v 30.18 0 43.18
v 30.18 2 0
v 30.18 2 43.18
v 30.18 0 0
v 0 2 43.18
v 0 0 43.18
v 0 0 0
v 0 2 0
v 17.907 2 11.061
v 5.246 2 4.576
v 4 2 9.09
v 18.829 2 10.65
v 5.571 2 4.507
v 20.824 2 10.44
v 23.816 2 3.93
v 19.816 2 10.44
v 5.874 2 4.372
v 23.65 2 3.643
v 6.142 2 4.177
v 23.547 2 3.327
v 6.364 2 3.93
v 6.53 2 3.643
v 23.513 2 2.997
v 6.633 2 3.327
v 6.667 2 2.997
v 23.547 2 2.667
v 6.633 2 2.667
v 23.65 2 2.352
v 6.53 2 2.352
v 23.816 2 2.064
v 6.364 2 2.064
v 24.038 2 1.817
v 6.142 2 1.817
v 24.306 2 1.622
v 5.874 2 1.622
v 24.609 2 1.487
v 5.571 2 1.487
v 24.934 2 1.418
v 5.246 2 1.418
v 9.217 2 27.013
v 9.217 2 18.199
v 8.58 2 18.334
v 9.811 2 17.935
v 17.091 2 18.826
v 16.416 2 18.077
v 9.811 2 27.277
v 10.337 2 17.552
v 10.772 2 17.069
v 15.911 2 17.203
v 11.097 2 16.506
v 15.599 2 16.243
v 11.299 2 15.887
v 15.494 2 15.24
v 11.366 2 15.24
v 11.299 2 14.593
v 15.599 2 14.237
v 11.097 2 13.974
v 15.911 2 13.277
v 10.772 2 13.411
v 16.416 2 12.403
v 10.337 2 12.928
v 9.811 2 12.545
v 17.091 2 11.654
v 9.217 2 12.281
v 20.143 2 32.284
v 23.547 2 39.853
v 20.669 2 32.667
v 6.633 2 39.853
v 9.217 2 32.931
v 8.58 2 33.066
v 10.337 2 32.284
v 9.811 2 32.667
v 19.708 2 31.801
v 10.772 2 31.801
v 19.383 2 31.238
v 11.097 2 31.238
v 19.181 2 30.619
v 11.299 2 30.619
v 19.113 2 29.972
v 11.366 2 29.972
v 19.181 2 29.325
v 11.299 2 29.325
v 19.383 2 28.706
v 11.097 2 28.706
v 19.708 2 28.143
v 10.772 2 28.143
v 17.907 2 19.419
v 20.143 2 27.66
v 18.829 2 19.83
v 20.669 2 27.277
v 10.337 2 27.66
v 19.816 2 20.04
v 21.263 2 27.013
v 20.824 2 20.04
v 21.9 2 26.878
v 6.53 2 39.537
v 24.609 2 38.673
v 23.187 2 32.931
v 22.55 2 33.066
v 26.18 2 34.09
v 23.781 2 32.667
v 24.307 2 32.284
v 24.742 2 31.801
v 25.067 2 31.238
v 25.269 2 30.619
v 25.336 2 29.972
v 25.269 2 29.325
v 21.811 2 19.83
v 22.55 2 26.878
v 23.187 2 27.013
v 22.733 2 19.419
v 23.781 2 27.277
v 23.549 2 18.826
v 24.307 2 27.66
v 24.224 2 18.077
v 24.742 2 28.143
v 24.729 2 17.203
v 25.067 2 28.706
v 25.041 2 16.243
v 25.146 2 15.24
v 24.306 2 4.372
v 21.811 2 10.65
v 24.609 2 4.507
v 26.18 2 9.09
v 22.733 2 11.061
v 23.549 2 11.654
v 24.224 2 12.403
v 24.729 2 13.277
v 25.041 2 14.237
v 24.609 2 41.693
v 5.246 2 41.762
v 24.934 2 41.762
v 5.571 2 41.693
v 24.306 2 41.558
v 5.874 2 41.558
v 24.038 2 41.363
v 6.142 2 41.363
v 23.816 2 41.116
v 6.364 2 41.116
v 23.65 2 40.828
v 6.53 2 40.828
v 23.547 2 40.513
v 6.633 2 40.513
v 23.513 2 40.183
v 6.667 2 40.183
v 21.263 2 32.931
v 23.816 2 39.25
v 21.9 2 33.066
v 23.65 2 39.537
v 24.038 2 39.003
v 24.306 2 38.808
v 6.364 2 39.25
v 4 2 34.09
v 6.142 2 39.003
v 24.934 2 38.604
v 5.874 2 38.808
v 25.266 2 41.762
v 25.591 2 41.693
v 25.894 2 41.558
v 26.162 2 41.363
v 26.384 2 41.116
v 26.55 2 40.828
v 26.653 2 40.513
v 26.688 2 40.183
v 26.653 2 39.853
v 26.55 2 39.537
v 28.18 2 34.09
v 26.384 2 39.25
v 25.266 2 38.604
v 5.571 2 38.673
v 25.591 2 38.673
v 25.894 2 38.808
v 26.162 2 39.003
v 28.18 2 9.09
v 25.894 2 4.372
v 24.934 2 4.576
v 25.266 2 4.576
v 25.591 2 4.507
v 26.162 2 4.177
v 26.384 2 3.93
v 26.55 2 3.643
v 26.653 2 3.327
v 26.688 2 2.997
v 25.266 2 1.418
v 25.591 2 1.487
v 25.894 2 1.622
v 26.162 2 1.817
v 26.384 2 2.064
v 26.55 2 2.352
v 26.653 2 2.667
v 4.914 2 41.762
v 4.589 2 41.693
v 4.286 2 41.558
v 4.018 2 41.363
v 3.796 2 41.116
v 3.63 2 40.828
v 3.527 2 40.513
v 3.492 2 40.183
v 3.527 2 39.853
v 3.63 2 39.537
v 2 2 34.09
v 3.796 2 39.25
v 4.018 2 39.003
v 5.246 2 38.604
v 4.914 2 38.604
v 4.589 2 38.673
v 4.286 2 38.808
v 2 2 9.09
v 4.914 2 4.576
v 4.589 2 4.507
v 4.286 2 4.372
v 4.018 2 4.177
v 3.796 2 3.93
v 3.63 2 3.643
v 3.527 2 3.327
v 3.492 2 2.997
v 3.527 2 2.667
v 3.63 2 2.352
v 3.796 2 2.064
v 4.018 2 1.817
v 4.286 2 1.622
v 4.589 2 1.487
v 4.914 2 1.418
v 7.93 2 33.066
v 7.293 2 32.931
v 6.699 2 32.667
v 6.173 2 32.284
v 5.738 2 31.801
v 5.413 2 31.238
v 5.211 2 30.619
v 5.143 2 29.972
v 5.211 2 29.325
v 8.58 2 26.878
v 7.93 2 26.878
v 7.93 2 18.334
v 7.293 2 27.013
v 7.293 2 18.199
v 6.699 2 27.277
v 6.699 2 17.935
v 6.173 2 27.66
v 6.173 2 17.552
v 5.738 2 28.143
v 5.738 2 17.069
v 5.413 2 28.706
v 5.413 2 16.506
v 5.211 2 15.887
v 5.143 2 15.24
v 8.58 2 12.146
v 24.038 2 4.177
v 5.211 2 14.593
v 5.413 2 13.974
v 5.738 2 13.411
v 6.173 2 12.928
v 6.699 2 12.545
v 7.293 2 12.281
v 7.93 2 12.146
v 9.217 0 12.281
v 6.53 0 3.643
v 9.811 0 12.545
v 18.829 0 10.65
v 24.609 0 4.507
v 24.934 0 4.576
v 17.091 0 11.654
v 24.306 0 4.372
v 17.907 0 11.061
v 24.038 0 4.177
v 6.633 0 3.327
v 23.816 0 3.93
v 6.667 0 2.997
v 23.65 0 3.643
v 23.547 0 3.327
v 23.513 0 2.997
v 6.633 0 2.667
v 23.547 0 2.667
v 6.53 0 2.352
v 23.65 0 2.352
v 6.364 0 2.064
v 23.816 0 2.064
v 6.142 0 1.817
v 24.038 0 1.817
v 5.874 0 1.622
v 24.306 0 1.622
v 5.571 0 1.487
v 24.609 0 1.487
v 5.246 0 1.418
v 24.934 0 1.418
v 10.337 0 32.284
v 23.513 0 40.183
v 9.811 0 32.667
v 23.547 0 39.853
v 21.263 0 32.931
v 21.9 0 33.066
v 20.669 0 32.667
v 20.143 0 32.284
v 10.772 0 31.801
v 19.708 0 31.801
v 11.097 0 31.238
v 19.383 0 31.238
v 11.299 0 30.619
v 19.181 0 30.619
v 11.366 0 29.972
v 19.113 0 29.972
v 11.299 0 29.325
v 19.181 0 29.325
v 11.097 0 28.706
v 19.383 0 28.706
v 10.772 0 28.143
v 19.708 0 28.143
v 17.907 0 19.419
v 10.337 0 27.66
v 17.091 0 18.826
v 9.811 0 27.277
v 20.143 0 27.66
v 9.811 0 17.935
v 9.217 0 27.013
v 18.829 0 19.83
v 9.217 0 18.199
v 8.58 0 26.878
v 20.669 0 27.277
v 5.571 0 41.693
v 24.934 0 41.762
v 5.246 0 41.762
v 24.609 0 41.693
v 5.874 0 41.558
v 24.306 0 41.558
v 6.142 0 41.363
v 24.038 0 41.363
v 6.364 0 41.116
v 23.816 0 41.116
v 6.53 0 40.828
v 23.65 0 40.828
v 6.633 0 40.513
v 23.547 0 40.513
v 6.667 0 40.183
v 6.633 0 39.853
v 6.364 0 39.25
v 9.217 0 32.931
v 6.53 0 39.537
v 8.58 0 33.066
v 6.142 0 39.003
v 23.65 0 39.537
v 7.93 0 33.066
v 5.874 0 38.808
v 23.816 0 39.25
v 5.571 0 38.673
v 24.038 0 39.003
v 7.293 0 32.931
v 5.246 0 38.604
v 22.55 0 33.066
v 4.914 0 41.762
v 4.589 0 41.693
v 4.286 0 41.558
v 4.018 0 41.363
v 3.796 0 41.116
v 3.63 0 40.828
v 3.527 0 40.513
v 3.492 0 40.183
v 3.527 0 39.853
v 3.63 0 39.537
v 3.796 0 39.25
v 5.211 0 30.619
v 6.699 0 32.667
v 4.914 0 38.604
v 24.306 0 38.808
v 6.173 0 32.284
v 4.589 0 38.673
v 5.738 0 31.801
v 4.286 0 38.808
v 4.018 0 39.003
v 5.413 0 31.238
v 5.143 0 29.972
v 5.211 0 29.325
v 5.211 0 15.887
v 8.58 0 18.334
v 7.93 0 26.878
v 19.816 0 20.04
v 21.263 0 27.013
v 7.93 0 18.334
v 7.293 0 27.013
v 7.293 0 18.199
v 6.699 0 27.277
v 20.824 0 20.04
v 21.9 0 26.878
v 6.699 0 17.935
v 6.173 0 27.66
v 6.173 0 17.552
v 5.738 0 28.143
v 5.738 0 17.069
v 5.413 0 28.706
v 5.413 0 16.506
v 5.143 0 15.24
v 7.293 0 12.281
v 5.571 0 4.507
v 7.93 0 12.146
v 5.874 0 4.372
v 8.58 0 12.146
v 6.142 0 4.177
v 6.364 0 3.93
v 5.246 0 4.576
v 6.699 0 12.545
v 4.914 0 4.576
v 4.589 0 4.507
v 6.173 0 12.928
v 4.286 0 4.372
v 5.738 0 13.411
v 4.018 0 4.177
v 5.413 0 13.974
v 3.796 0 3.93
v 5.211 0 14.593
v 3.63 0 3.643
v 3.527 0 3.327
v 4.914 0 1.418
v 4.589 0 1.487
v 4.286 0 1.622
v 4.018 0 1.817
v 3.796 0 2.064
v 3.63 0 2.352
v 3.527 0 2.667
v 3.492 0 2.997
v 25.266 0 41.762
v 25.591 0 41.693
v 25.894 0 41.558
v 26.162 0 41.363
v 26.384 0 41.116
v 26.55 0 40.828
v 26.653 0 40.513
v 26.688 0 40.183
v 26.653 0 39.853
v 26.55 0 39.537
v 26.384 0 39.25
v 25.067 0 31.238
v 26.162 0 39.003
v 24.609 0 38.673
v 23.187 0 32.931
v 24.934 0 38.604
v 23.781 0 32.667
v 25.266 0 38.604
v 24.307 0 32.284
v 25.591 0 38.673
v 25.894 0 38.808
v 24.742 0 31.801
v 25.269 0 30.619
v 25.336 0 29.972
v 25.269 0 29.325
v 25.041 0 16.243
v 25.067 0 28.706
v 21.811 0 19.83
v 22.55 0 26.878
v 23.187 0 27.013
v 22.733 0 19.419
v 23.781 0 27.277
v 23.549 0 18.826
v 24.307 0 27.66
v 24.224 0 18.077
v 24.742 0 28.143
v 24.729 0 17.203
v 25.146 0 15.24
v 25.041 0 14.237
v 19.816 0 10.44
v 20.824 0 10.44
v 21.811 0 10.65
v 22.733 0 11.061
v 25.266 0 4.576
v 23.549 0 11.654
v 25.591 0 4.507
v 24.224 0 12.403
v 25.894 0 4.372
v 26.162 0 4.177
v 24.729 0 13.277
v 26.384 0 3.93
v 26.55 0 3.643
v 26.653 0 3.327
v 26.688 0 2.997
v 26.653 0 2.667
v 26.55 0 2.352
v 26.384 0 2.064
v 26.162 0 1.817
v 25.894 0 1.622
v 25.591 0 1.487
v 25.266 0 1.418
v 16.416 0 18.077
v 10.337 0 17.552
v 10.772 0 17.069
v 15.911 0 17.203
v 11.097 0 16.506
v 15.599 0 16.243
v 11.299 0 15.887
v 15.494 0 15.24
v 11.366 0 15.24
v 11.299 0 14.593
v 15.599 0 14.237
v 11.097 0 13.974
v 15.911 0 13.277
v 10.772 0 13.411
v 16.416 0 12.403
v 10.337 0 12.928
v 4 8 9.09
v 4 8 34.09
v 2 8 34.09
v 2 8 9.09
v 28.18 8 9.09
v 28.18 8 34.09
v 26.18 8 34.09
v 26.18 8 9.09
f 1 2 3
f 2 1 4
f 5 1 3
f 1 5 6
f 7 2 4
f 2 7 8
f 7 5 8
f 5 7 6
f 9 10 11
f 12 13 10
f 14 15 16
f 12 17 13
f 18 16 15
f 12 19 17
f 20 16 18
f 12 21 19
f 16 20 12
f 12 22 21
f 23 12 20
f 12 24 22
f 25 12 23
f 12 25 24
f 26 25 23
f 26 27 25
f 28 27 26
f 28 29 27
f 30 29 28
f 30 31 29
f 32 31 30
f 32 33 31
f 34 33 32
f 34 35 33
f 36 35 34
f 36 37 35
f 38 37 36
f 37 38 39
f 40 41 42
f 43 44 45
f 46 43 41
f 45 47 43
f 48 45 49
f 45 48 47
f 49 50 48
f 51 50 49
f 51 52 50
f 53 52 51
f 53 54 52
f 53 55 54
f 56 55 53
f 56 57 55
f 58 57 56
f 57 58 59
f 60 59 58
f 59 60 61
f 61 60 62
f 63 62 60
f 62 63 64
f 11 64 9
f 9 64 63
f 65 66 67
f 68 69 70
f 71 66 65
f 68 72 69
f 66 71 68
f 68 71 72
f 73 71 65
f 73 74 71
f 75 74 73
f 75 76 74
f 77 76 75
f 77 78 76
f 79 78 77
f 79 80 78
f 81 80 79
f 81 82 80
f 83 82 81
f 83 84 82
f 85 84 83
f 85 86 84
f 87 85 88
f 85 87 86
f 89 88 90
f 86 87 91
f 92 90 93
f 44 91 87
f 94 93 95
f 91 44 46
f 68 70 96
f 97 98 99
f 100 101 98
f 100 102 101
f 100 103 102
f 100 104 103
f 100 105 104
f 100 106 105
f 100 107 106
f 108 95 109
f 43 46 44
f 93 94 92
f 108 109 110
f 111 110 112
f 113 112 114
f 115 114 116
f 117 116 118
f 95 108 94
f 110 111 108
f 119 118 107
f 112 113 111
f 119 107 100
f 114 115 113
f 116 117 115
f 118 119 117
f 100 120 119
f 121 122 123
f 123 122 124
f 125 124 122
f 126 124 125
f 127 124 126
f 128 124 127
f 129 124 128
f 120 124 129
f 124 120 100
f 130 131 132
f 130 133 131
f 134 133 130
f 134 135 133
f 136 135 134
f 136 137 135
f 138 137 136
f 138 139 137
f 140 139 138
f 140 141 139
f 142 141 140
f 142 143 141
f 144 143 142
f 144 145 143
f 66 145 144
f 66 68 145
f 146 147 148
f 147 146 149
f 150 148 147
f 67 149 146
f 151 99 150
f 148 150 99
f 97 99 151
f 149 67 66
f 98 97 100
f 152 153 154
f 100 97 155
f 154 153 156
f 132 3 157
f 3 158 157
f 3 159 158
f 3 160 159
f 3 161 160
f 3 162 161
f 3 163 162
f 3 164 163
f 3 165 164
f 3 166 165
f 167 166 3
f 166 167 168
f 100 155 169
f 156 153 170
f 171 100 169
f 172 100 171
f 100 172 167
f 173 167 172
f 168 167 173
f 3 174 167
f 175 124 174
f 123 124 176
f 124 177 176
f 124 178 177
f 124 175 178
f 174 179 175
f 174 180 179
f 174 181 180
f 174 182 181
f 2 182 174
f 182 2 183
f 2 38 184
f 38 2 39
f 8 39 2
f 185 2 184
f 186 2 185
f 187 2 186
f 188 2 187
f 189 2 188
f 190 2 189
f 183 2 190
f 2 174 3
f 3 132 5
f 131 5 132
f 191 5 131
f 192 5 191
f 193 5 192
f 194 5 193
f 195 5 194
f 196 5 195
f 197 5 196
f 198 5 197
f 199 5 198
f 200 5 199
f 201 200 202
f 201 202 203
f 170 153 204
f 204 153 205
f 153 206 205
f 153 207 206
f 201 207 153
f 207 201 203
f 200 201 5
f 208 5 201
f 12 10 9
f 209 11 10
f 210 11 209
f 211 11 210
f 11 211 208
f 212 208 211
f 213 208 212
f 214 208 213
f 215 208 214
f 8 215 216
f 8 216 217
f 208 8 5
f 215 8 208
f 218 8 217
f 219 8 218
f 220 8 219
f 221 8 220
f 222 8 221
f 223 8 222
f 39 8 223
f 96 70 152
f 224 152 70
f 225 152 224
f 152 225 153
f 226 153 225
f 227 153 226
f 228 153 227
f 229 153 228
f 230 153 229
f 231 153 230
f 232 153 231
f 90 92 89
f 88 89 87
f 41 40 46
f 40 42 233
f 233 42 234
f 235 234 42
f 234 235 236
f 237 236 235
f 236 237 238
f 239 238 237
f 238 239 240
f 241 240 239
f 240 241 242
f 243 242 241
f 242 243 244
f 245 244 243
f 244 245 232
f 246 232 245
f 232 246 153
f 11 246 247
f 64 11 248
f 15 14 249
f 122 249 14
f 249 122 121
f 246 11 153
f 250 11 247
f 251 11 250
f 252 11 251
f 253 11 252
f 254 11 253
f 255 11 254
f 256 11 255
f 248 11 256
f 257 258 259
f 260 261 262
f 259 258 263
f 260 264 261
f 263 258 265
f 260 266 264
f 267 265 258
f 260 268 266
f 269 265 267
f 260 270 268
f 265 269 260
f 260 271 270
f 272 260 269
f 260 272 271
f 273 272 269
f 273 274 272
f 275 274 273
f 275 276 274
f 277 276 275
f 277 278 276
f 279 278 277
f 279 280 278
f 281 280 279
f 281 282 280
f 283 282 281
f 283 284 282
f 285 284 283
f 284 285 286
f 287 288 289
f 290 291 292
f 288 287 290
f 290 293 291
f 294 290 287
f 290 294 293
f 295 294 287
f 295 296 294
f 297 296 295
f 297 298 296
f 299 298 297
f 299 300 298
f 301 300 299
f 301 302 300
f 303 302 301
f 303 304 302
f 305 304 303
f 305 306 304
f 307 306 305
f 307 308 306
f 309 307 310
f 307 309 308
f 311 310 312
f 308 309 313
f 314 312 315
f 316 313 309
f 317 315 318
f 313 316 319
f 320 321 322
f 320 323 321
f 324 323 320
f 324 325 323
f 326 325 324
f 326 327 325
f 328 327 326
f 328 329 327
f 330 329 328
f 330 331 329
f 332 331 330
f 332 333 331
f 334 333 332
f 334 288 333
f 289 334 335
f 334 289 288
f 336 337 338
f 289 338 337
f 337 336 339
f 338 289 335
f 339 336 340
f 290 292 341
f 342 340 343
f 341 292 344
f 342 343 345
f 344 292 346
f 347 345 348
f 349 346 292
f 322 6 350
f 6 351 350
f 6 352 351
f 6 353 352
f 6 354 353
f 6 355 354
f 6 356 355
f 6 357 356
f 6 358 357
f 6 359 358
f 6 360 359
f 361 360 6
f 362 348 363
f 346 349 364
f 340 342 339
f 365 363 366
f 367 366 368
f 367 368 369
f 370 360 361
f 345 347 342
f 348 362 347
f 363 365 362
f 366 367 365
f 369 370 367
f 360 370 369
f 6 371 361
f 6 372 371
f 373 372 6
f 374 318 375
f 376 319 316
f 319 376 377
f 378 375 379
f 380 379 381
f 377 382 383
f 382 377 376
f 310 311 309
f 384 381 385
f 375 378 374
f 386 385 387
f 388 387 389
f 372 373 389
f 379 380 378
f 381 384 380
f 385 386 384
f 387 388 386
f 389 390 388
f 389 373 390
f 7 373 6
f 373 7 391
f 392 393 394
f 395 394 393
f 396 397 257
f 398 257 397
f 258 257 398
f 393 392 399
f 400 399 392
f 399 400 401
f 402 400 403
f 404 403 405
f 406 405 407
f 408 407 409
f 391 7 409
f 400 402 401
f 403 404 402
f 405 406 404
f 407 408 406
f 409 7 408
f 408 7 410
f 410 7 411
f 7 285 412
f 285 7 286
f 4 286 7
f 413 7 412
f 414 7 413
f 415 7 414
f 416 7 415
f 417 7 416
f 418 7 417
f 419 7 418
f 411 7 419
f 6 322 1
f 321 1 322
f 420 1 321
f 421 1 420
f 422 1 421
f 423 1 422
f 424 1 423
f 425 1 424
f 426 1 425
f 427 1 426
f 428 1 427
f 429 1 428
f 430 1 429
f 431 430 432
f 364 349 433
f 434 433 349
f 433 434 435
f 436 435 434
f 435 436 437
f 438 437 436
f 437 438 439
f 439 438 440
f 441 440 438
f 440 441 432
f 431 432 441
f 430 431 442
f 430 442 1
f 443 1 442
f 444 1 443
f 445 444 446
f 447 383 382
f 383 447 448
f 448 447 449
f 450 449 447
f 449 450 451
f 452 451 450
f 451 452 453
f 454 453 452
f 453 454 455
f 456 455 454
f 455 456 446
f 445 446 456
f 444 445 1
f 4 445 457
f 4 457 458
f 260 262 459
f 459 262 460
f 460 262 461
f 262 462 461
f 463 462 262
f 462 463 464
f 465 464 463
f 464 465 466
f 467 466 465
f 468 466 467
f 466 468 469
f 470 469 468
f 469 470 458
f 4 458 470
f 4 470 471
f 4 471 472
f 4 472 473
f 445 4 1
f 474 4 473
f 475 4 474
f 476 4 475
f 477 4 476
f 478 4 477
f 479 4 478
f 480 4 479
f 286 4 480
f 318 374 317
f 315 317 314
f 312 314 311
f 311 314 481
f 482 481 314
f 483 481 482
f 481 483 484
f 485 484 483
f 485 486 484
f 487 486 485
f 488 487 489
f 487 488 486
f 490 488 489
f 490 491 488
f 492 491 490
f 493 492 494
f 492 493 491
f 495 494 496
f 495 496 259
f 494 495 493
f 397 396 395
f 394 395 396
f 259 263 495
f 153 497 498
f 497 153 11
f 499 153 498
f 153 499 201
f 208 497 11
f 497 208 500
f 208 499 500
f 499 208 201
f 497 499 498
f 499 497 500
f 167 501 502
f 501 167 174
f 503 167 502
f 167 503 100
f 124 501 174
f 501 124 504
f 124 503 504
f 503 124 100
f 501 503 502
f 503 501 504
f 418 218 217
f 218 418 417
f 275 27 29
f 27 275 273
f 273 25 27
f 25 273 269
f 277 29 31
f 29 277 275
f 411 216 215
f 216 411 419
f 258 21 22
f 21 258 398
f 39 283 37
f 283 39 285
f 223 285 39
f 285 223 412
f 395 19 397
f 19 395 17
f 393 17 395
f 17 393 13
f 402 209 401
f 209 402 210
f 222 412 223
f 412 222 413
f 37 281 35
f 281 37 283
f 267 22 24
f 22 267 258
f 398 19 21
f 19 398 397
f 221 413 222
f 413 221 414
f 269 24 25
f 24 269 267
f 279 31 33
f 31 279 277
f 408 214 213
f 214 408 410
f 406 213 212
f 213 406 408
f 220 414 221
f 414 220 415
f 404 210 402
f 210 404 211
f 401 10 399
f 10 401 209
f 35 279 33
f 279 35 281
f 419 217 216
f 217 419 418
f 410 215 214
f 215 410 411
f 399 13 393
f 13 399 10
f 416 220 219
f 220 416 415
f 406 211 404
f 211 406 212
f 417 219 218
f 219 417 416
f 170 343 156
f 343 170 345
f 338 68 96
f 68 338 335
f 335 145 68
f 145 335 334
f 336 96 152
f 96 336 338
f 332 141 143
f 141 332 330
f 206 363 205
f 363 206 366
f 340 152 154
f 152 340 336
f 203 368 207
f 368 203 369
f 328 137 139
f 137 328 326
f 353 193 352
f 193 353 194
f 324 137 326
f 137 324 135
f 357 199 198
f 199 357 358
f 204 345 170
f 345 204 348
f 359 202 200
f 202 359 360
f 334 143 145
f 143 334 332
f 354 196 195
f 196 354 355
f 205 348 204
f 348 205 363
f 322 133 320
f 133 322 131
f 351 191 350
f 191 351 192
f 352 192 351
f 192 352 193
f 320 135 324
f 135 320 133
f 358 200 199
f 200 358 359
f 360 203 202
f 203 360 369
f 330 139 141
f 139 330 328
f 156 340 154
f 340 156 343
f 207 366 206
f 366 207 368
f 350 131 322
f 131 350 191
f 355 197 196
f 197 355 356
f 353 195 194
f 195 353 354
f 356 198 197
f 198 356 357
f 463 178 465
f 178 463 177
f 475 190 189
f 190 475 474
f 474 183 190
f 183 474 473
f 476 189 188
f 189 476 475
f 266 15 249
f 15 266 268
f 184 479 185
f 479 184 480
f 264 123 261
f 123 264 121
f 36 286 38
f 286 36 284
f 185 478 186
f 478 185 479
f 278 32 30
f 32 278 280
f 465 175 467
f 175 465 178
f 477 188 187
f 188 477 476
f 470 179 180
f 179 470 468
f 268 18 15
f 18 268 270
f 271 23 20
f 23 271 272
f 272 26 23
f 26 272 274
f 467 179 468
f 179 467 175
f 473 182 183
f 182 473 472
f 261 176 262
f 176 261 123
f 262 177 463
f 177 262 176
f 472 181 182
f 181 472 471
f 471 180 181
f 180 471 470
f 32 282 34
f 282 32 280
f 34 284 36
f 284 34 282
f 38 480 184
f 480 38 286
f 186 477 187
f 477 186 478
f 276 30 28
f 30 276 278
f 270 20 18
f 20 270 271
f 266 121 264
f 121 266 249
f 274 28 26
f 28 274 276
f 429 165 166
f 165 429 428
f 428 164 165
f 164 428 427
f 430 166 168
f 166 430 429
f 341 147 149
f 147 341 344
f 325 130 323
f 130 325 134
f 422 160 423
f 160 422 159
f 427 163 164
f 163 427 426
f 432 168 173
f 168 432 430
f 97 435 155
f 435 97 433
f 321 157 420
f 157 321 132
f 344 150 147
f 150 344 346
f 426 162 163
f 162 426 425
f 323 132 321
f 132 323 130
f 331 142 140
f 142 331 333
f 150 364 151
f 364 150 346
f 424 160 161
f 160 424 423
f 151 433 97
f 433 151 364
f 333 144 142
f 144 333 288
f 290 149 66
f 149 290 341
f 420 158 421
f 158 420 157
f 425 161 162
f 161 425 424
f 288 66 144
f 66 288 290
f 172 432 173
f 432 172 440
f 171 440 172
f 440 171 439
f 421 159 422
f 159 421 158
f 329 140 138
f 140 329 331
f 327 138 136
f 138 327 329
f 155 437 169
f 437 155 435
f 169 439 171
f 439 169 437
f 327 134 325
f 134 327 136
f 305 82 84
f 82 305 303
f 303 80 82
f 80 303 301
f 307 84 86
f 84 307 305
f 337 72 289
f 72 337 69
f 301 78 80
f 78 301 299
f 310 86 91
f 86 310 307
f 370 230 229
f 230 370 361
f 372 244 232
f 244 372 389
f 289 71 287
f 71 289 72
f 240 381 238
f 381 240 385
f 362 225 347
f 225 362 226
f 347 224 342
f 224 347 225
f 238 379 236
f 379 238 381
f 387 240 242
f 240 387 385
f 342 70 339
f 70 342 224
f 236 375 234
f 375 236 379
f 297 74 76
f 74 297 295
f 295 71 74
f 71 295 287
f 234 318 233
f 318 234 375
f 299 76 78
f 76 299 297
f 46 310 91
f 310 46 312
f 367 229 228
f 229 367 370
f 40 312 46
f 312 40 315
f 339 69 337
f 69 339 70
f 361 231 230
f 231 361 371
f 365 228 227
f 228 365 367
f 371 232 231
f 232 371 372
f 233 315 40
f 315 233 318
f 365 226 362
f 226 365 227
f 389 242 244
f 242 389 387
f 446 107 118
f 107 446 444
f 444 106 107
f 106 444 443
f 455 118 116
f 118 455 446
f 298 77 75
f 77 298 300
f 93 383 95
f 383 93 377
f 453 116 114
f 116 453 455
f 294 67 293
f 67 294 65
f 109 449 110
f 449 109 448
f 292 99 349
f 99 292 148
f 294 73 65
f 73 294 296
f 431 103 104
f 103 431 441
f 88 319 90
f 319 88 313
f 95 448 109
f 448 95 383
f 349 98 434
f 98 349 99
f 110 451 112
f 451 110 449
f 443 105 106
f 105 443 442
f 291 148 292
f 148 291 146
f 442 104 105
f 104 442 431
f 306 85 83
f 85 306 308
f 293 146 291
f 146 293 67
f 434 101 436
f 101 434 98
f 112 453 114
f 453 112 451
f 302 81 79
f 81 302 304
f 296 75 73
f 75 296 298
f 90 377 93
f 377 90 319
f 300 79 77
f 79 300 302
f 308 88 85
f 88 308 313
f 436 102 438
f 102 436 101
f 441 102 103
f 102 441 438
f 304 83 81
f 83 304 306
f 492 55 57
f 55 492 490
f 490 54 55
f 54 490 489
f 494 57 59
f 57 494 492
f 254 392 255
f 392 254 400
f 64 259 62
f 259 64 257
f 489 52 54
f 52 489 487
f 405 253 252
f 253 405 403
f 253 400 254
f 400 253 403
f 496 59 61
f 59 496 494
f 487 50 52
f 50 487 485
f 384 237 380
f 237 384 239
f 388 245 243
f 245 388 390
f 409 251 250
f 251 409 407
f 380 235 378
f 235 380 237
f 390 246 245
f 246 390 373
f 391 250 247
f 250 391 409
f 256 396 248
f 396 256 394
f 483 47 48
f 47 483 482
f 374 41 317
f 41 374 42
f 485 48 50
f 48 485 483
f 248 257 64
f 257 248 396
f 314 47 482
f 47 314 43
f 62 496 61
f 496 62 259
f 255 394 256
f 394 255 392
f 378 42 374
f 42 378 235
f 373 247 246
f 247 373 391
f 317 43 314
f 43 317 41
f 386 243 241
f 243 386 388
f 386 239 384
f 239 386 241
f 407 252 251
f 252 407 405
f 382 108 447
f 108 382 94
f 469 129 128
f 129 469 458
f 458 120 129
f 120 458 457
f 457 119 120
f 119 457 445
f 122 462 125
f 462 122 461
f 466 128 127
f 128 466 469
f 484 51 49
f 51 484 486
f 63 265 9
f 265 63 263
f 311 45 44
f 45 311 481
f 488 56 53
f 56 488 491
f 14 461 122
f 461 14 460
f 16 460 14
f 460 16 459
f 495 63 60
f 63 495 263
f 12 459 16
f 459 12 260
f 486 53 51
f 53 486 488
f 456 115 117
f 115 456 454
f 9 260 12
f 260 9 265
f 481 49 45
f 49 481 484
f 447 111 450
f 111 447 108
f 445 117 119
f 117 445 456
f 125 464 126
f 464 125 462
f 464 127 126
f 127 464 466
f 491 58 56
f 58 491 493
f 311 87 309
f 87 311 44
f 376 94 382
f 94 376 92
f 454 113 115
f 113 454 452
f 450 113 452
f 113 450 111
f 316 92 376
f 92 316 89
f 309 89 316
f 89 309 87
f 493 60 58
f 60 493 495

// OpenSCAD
// file: tile_common.scad
// put a hole in the tile of diameter 'd' at position 'x','z'
module hole( x, z, d) {
    translate([x, 0, z])
        rotate([270,0,0])
            cylinder(r=(d / 2), h=10, center=true);
}
// file: blank_tile.scad
hp = 6; // width in hole points
plate_height = 1.7 * 25.4; // spec is 1.7"
plate_width = hp * 5.08 - 0.3; // general conversion factor with fudge for tolerance

module front_face() {
    thickness = 2; // thickness of PCB front panels
    cube([plate_width, thickness, plate_height], center=false);
}

rib_width = 2;
rib_inset = 2;
rib_height = 25; // max physically measured at 29.06
rib_depth = 8;
module left_stiffening_rib() {
    translate([rib_inset, 0, ((plate_height - rib_height) / 2)]){
        cube([rib_width, rib_depth, rib_height], center=false);
    }
}

module right_stiffening_rib() {
    translate([((plate_width - rib_width) - rib_inset), 0, ((plate_height - rib_height) / 2)]){
        cube([rib_width, rib_depth, rib_height], center=false);
    }
}

module material() {
    union() {
        front_face();
        left_stiffening_rib();
        right_stiffening_rib();
    }
}

module mounting_holes() {
    // make round shapes more fine
    $fs = 0.1;

    mounting_hole_dia = 0.125 * 25.4; // spec 0.125"
    hole_horiz_offset = 0.2 * 25.4; // spec 0.200"
    hole_vert_offset = 0.118 * 25.4; // spec 0.118"

    module hole_pair(h_offset) {
        translate([h_offset, 0, hole_vert_offset])
            rotate([270,0,0])
                cylinder(r=mounting_hole_dia / 2, h=10, center=true);
        
        translate([h_offset, 0, plate_height - hole_vert_offset])
            rotate([270,0,0])
                cylinder(r=mounting_hole_dia / 2, h=10, center=true);
    }
    hole_pair(hole_horiz_offset);
    hole_pair(plate_width - hole_horiz_offset);
}

module cutouts() {
    mounting_holes();
}
module blank_tile() {
    difference() {
        material();
        cutouts();
    }
}

blank_tile();
// main file
/*
A Pulp Logic compatible 1U with cutouts to mount three jacks and one potentiometer.

Inspired by some of the examples given here:
http://pulplogic.com/1u_tiles/

units: millimeters
*/

use <blank_tile.scad>
use <tile_common.scad>

function inches( x) = x * 25.4; // convert inches to mm

module cutouts() {
    $fs=0.01; // make cylinder curves more fine

    // top-left jack
    hole(x=inches(0.325), z=inches(1.180), d=inches(0.245));

    // top-right jack
    hole(x=inches(0.875), z=inches(1.180), d=inches(0.245));
    
    // bottom-left jack
    hole(x=inches(0.325), z=inches(0.600), d=inches(0.245));

    // bottom-right potentiometer
    hole(x=inches(0.800), z=inches(0.600), d=inches(0.380));
}

module one_pot_two_jacks() {
    difference() {
        blank_tile();
        cutouts();
    }
}

one_pot_two_jacks();
